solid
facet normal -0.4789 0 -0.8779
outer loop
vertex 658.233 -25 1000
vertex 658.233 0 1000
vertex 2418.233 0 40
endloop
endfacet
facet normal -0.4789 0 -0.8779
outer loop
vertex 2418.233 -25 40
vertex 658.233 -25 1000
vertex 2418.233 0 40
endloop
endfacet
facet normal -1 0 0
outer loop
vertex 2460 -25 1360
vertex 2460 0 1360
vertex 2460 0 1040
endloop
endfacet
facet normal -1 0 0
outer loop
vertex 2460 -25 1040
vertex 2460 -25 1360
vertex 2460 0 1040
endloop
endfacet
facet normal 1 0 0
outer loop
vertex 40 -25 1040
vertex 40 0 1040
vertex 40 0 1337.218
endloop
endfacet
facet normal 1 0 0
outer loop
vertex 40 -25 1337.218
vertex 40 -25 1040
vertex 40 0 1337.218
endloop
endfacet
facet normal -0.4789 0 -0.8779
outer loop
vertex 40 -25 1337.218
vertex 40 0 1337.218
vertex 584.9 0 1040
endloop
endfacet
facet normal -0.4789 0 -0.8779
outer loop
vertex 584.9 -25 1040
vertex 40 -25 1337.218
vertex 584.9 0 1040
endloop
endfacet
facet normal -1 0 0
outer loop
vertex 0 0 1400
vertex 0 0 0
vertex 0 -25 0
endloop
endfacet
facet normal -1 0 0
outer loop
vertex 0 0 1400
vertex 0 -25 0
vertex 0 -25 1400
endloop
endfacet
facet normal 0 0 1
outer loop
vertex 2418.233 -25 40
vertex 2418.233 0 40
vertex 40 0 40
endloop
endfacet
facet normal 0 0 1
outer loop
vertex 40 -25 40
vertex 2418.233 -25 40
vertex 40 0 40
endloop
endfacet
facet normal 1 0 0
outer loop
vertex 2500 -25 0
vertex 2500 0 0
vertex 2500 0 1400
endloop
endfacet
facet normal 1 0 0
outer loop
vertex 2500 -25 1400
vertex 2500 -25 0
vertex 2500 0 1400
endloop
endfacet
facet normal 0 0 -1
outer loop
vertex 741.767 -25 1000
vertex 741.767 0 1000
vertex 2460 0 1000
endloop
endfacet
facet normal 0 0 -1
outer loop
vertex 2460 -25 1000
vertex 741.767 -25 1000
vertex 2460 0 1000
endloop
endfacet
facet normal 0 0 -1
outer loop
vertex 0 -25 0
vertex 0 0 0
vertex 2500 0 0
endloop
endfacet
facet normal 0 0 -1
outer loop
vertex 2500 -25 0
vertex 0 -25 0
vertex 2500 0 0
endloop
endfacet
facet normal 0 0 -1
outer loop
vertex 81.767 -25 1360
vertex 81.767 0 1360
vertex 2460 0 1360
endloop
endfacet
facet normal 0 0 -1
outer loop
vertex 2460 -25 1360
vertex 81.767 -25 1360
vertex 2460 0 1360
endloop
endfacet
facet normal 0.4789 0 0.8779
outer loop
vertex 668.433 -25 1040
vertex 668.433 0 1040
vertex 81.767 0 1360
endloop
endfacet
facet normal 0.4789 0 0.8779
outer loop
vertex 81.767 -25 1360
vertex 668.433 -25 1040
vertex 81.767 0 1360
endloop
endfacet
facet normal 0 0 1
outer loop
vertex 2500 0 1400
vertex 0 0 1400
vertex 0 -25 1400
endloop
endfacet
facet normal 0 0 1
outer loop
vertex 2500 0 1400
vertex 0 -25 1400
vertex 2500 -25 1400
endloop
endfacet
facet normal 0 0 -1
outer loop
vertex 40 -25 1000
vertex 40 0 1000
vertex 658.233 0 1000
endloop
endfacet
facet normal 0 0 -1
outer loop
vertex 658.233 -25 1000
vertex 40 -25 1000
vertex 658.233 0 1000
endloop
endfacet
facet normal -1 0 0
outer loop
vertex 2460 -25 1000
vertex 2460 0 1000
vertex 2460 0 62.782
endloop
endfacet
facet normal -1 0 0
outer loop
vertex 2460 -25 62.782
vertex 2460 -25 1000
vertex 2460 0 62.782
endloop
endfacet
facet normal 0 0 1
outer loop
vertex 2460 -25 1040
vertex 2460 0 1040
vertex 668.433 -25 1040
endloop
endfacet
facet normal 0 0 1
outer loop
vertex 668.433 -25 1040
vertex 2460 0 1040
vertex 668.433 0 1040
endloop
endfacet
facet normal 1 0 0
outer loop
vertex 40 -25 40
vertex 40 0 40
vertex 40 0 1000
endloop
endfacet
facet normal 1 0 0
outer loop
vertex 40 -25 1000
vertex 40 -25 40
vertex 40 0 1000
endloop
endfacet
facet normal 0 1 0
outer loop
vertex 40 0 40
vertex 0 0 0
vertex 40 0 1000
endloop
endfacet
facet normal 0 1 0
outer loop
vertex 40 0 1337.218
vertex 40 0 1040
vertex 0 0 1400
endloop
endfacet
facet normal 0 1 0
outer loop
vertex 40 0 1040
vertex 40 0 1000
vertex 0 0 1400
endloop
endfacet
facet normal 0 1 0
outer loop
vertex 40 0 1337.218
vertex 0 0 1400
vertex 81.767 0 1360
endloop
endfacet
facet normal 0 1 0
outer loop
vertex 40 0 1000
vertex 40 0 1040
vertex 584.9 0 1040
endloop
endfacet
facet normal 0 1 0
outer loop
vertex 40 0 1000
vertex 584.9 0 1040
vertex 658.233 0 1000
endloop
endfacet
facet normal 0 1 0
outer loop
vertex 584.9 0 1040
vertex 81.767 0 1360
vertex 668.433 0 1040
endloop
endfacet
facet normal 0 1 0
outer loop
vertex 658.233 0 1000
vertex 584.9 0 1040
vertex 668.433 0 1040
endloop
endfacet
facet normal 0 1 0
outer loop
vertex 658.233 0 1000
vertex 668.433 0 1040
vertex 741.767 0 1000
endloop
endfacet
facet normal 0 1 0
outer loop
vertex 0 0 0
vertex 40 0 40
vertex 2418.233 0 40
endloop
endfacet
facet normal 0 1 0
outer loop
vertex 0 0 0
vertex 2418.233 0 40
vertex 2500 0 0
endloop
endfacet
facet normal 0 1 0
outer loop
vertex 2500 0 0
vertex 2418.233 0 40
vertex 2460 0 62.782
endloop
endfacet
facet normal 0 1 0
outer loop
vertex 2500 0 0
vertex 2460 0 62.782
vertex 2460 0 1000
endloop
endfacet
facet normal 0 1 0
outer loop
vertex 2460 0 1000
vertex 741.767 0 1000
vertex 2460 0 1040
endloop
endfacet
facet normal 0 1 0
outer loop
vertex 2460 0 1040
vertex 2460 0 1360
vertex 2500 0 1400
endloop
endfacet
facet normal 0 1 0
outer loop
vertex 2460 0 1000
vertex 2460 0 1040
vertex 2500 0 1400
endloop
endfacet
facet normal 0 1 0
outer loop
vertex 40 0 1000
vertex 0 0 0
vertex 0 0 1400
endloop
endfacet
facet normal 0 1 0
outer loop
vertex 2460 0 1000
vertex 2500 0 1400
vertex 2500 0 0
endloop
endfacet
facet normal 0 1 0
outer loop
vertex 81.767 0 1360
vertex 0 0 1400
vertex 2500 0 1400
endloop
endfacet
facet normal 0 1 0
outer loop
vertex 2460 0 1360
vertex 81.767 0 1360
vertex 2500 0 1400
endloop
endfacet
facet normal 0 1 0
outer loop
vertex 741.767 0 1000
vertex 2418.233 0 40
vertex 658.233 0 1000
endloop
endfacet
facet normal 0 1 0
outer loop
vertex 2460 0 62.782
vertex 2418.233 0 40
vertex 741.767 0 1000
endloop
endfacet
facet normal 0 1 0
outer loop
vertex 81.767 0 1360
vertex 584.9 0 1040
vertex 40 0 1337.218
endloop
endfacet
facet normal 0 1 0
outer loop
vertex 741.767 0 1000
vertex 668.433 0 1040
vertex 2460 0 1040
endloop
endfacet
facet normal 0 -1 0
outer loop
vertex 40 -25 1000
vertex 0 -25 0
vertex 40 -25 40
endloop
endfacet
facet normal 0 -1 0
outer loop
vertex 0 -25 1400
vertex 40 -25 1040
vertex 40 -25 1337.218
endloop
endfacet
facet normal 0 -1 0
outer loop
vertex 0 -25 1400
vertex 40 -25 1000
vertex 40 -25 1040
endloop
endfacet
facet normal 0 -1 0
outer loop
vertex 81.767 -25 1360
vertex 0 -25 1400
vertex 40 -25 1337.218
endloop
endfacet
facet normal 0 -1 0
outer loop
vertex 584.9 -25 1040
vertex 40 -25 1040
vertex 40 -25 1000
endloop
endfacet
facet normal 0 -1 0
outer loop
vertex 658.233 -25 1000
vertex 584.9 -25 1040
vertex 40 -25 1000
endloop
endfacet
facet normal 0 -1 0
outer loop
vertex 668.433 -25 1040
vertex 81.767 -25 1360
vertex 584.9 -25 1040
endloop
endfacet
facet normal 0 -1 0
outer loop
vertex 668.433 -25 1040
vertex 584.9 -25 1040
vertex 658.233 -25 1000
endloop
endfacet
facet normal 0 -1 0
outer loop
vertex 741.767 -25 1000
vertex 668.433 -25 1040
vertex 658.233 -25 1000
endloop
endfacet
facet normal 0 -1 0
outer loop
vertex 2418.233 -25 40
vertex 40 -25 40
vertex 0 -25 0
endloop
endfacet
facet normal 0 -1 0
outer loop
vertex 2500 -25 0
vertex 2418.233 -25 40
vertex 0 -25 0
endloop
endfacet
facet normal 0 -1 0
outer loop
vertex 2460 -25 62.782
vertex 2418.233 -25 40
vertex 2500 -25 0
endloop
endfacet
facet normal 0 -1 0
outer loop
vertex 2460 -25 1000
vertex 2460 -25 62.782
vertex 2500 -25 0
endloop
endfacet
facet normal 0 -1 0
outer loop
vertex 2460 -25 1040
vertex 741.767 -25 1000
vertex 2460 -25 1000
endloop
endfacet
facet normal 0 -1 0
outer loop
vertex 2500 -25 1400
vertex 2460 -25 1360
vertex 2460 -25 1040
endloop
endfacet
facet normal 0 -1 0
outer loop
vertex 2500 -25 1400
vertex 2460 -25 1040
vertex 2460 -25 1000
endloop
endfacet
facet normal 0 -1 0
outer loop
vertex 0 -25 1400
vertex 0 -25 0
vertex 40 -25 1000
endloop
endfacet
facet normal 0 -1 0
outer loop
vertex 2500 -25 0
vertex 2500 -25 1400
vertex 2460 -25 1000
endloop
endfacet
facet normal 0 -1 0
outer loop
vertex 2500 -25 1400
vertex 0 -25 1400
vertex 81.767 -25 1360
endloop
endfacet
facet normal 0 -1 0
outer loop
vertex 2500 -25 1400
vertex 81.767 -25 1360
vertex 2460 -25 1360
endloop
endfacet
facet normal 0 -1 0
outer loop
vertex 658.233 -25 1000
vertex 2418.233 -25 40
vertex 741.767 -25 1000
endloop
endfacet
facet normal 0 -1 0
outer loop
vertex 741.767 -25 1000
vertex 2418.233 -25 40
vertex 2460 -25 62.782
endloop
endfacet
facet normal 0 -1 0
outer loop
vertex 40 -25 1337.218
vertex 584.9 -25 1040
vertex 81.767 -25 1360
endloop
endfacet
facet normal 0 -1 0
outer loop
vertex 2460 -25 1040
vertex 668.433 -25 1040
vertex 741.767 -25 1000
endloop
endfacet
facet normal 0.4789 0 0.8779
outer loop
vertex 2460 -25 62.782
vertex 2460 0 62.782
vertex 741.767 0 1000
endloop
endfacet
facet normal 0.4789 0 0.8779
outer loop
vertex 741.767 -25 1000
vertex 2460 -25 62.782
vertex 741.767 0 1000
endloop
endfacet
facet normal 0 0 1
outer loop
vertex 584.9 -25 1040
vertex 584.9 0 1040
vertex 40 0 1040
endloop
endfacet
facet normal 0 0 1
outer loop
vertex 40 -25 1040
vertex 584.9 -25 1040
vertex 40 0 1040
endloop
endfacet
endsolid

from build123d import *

# Parameters (mm, degrees)
F0_W     = 2500
F0_H     = 1400
F1_DEPTH = 25


with BuildPart() as f1:
    # F0 (on Front) → F1 (new body)
    with BuildSketch(Plane.XZ):
        with Locations((1250, 700)):
            Rectangle(F0_W, F0_H)
        Polygon((40, 1337.2182471161), (40, 1360), (81.7665469538, 1360), (2460, 1360), (2460, 1040), (2460, 1000), (2460, 62.7817528839), (2460, 40), (2418.2334530462, 40), (40, 40), (40, 1000), (40, 1040), align=None, mode=Mode.SUBTRACT)
        Polygon((2460, 62.7817528839), (741.7665469538, 1000), (658.2334530462, 1000), (2418.2334530462, 40), (2460, 40), align=None)
        Polygon((2460, 1040), (668.4332136205, 1040), (741.7665469538, 1000), (2460, 1000), align=None)
        Polygon((81.7665469538, 1360), (40, 1360), (40, 1337.2182471161), (584.9001197129, 1040), (668.4332136205, 1040), align=None)
        Polygon((584.9001197129, 1040), (40, 1040), (40, 1000), (658.2334530462, 1000), align=None)
        Polygon((741.7665469538, 1000), (668.4332136205, 1040), (584.9001197129, 1040), (658.2334530462, 1000), align=None)
    extrude(amount=F1_DEPTH)


solid = f1.part
